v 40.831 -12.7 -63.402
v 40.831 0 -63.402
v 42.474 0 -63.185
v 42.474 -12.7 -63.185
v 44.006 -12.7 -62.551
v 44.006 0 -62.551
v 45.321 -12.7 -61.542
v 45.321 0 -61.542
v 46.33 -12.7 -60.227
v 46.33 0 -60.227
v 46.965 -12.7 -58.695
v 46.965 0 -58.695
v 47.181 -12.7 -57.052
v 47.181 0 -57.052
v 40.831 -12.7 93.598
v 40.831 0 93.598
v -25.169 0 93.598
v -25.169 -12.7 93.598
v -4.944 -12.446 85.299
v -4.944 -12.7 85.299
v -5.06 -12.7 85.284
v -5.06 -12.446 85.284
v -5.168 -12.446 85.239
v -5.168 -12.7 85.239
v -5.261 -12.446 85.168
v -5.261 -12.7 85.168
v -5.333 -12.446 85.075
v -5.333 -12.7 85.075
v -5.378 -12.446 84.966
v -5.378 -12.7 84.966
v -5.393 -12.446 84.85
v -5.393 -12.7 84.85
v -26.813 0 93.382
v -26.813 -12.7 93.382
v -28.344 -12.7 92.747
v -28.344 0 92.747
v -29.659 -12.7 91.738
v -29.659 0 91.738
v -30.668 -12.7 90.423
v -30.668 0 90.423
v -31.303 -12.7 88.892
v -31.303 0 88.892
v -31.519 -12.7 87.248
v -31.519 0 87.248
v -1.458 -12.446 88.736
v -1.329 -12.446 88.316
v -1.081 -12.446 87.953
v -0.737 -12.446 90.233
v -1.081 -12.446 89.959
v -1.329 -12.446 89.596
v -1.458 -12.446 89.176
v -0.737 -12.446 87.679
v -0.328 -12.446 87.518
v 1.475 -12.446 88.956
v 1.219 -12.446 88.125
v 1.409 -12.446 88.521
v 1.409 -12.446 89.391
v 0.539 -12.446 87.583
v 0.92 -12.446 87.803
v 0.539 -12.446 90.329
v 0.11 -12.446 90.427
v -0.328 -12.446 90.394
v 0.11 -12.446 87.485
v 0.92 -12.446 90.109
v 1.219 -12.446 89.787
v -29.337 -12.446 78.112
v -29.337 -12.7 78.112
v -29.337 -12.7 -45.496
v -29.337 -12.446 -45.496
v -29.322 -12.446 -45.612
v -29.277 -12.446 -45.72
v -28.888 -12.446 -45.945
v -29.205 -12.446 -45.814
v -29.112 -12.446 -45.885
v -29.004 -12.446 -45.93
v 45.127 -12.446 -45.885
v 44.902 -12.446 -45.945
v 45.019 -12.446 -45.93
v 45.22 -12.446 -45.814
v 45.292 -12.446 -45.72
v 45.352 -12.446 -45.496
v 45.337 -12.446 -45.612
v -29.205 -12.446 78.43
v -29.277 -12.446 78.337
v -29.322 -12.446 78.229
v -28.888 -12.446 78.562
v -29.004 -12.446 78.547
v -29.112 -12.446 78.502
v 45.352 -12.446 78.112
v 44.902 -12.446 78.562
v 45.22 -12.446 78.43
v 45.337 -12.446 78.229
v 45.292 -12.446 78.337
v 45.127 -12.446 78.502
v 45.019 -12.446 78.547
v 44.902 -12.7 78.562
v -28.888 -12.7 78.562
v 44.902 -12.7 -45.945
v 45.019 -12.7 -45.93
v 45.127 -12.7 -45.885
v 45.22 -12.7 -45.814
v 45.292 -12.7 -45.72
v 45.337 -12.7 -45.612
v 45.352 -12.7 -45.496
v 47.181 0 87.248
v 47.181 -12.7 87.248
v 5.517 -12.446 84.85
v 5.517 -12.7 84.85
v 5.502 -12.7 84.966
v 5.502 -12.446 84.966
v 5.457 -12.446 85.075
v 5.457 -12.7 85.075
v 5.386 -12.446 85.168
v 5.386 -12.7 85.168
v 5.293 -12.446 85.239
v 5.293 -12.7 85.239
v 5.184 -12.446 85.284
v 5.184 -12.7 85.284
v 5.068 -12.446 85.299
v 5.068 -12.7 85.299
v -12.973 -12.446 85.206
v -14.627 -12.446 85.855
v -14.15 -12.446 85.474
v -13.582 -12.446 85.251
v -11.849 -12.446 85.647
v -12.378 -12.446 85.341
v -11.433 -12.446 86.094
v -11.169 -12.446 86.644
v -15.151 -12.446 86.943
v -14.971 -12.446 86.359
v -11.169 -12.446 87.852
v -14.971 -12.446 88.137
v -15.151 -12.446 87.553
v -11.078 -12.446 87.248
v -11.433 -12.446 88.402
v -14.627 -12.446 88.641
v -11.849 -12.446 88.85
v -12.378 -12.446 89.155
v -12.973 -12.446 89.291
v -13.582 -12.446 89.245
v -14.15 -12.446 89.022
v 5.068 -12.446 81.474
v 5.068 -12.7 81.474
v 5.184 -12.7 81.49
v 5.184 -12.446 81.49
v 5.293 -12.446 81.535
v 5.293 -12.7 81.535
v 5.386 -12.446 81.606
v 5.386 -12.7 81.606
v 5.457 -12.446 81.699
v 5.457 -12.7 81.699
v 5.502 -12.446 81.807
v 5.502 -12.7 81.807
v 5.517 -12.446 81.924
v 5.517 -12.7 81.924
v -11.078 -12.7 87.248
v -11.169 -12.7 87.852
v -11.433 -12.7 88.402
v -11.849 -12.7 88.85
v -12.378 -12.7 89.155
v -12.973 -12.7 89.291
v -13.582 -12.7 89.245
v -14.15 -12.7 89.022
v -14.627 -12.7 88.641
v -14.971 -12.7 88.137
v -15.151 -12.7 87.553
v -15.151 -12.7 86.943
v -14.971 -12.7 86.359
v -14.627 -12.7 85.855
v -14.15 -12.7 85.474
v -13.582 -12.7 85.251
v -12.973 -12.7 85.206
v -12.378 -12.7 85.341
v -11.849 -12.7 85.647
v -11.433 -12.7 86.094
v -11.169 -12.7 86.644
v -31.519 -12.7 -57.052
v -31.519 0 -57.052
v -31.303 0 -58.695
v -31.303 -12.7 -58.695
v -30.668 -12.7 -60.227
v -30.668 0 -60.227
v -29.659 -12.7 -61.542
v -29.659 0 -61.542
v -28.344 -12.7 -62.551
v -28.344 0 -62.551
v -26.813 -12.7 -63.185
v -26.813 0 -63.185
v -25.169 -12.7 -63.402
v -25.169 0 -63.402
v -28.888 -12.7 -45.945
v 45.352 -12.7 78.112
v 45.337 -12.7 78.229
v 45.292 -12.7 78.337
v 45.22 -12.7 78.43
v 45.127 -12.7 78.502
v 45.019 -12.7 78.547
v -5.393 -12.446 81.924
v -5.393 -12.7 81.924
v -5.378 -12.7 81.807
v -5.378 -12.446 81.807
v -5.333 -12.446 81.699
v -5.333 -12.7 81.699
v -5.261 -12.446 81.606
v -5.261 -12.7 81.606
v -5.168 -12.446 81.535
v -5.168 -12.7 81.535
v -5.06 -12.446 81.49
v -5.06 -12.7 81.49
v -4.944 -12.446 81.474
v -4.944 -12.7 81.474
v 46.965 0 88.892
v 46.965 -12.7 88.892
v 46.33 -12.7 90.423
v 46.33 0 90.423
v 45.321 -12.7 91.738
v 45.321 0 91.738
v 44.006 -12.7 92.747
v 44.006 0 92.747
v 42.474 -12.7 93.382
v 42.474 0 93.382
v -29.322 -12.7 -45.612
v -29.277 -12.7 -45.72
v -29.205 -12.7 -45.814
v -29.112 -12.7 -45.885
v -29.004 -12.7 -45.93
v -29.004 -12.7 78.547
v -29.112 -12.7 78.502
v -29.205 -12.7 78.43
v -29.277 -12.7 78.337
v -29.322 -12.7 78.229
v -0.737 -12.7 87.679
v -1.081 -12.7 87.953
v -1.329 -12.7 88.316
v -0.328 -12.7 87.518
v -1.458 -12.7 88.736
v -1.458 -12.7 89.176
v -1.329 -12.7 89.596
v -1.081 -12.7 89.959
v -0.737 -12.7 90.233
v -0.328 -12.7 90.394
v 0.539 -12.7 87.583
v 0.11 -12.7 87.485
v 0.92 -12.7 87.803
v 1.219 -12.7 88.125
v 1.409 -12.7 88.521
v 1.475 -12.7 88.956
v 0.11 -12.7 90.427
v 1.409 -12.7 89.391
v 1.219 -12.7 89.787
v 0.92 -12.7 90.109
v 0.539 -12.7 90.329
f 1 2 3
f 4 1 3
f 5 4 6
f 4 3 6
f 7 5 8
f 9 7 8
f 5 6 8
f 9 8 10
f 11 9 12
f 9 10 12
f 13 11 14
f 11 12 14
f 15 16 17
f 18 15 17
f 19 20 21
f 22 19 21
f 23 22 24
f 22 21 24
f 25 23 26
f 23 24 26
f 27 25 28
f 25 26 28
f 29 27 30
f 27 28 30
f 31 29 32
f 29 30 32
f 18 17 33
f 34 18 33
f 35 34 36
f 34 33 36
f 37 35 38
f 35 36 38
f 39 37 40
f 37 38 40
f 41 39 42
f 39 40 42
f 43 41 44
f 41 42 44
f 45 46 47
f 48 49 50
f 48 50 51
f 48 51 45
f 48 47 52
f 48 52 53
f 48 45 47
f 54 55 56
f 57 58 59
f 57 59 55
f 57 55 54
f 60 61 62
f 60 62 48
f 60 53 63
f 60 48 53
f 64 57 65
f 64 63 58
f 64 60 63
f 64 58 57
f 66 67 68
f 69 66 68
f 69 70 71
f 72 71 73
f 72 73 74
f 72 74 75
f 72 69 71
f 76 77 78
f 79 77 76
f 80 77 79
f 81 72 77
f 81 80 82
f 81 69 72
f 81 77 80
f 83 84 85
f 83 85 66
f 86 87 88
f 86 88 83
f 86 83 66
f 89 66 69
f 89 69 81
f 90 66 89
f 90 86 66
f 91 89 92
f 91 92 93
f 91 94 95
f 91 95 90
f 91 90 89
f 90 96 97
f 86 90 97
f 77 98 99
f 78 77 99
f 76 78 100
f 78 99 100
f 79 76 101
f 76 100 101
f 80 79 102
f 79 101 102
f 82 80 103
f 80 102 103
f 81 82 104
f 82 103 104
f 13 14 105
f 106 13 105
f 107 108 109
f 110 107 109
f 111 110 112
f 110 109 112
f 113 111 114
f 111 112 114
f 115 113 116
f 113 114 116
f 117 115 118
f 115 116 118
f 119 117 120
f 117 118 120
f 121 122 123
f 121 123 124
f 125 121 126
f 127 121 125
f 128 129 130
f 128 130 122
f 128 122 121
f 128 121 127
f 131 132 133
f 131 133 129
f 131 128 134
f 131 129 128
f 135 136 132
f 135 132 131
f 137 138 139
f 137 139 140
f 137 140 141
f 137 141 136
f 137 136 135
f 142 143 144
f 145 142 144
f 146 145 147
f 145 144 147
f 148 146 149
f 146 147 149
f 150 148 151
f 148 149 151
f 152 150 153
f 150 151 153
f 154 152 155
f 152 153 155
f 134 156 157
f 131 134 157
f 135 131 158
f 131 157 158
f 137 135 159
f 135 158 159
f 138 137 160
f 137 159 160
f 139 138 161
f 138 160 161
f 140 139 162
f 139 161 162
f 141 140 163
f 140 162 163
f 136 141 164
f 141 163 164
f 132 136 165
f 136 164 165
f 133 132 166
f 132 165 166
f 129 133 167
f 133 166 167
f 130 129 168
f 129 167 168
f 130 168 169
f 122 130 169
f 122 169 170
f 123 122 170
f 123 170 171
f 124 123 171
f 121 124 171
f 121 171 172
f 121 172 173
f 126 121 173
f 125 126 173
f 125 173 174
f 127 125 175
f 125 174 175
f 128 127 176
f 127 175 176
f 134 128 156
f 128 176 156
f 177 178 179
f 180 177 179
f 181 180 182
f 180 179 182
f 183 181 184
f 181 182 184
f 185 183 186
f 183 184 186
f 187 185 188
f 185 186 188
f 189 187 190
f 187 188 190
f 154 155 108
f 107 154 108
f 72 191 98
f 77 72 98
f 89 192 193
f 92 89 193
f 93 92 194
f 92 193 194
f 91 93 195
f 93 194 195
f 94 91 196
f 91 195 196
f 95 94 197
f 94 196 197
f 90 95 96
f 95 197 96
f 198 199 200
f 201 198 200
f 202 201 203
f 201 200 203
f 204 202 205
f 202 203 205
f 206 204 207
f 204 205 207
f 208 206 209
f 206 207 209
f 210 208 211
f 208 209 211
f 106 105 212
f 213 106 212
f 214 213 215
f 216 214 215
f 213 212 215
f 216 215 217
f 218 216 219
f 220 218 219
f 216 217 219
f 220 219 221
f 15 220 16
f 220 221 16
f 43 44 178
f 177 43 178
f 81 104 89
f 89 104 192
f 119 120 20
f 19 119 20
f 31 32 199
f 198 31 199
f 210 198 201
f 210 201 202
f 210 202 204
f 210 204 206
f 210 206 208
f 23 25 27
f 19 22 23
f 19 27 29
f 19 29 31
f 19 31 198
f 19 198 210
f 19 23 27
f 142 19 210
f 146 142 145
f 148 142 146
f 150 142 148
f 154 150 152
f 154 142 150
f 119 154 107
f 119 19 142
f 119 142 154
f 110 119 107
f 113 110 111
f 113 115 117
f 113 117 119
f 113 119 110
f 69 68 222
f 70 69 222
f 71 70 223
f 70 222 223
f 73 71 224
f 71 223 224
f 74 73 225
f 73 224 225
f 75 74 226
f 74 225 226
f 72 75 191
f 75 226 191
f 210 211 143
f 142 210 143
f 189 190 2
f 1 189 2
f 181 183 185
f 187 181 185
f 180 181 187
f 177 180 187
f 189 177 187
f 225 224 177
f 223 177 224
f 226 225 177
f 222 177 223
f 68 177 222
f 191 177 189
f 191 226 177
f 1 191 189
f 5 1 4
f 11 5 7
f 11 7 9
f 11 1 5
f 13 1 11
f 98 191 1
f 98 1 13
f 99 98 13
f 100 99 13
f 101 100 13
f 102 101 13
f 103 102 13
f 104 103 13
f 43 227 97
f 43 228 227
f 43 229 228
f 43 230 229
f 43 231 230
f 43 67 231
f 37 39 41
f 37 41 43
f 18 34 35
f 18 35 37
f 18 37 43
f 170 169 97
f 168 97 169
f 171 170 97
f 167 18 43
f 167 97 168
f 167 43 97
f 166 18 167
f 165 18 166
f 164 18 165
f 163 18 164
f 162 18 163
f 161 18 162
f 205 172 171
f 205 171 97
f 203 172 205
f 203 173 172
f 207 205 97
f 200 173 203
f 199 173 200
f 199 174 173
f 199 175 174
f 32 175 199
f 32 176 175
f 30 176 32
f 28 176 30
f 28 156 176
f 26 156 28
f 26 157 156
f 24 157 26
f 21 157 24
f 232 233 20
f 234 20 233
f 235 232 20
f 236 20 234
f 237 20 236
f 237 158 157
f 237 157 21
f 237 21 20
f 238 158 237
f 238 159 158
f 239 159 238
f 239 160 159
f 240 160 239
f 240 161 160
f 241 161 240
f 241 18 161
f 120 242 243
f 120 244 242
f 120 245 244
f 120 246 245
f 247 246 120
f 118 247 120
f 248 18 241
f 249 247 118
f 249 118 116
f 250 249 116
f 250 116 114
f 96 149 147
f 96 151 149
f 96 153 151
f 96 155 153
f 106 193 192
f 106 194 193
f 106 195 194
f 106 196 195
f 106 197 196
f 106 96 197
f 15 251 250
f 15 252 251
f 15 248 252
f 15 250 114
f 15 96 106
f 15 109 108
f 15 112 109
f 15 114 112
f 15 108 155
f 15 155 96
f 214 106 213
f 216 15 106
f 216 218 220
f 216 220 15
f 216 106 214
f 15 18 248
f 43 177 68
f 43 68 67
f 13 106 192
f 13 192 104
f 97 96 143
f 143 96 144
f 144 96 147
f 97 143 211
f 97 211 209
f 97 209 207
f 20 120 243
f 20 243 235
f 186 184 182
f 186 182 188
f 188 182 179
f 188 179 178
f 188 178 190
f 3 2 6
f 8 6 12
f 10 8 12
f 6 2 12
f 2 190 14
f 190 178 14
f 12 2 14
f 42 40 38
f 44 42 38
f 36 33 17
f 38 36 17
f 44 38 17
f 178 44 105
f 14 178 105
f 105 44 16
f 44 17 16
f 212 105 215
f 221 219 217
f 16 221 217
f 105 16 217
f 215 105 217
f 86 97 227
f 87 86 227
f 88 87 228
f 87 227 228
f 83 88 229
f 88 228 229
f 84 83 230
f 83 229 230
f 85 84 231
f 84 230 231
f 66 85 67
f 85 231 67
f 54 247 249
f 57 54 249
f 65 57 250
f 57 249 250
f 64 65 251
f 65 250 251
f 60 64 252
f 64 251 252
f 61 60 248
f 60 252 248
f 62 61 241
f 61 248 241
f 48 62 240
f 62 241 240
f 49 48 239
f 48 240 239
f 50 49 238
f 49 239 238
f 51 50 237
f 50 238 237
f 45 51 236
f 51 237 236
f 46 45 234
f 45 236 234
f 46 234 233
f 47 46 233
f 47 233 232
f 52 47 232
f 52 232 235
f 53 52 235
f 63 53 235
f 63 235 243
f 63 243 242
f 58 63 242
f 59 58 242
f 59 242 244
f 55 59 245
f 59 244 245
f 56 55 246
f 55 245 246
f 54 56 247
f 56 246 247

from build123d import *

# Parameters (mm, degrees)
F1_DEPTH = 12.7
F2_R     = 2.048268854
F2_R_2   = 1.4747920456
F3_DEPTH = 0.254


# Not quite as in the source:
# - a feature names something its author has since deleted; it is built from what else it names
# - the program builds the solid bodies; features that only make, move or delete a surface that nothing else refers to are left out


with BuildPart() as f1:
    # F0 (on Front) → F1 (new body)
    with BuildSketch(Plane.XZ):
        with BuildLine():
            Line((40.8309073806, 93.5981370211), (-25.1690926194, 93.5981370211))
            ThreePointArc((-25.1690926194, 93.5981370211), (-29.65922068, 91.7382650816), (-31.5190926194, 87.2481370211))
            Line((-31.5190926194, 87.2481370211), (-31.5190926194, -57.0518629789))
            ThreePointArc((-31.5190926194, -57.0518629789), (-29.65922068, -61.5419910395), (-25.1690926194, -63.4018629789))
            Line((-25.1690926194, -63.4018629789), (40.8309073806, -63.4018629789))
            ThreePointArc((40.8309073806, -63.4018629789), (45.3210354411, -61.5419910395), (47.1809073806, -57.0518629789))
            Line((47.1809073806, -57.0518629789), (47.1809073806, 87.2481370211))
            ThreePointArc((47.1809073806, 87.2481370211), (45.3210354411, 91.7382650816), (40.8309073806, 93.5981370211))
        make_face()
    extrude(amount=F1_DEPTH)

    # F2 (on face) → F3 (cut)
    with BuildSketch(Plane.XZ.offset(12.7)):
        with Locations((-13.1258289722, 87.2481370211)):
            Circle(F2_R)
        with Locations((0, 88.9561623335)):
            Circle(F2_R_2)
        with BuildLine():
            Line((5.0678964471, 85.2992907166), (-4.9437066773, 85.2992907166))
            ThreePointArc((-4.9437066773, 85.2992907166), (-5.2614981956, 85.1676571598), (-5.3931317525, 84.8498656414))
            Line((-5.3931317525, 84.8498656414), (-5.3931317525, 81.9237329997))
            ThreePointArc((-5.3931317525, 81.9237329997), (-5.2614981956, 81.6059414814), (-4.9437066773, 81.4743079245))
            Line((-4.9437066773, 81.4743079245), (5.0678964471, 81.4743079245))
            ThreePointArc((5.0678964471, 81.4743079245), (5.3856879655, 81.6059414814), (5.5173215223, 81.9237329997))
            Line((5.5173215223, 81.9237329997), (5.5173215223, 84.8498656414))
            ThreePointArc((5.5173215223, 84.8498656414), (5.3856879655, 85.1676571598), (5.0678964471, 85.2992907166))
        make_face()
        with BuildLine():
            Line((44.9024620466, 78.5618498921), (-28.8875750266, 78.5618498921))
            ThreePointArc((-28.8875750266, 78.5618498921), (-29.2053665449, 78.4302163352), (-29.3370001018, 78.1124248169))
            Line((-29.3370001018, 78.1124248169), (-29.3370001018, -45.495712664))
            ThreePointArc((-29.3370001018, -45.495712664), (-29.2053665449, -45.8135041823), (-28.8875750266, -45.9451377392))
            Line((-28.8875750266, -45.9451377392), (44.9024620466, -45.9451377392))
            ThreePointArc((44.9024620466, -45.9451377392), (45.2202535649, -45.8135041823), (45.3518871218, -45.495712664))
            Line((45.3518871218, -45.495712664), (45.3518871218, 78.1124248169))
            ThreePointArc((45.3518871218, 78.1124248169), (45.2202535649, 78.4302163352), (44.9024620466, 78.5618498921))
        make_face()
    extrude(amount=-F3_DEPTH, mode=Mode.SUBTRACT)


solid = f1.part
